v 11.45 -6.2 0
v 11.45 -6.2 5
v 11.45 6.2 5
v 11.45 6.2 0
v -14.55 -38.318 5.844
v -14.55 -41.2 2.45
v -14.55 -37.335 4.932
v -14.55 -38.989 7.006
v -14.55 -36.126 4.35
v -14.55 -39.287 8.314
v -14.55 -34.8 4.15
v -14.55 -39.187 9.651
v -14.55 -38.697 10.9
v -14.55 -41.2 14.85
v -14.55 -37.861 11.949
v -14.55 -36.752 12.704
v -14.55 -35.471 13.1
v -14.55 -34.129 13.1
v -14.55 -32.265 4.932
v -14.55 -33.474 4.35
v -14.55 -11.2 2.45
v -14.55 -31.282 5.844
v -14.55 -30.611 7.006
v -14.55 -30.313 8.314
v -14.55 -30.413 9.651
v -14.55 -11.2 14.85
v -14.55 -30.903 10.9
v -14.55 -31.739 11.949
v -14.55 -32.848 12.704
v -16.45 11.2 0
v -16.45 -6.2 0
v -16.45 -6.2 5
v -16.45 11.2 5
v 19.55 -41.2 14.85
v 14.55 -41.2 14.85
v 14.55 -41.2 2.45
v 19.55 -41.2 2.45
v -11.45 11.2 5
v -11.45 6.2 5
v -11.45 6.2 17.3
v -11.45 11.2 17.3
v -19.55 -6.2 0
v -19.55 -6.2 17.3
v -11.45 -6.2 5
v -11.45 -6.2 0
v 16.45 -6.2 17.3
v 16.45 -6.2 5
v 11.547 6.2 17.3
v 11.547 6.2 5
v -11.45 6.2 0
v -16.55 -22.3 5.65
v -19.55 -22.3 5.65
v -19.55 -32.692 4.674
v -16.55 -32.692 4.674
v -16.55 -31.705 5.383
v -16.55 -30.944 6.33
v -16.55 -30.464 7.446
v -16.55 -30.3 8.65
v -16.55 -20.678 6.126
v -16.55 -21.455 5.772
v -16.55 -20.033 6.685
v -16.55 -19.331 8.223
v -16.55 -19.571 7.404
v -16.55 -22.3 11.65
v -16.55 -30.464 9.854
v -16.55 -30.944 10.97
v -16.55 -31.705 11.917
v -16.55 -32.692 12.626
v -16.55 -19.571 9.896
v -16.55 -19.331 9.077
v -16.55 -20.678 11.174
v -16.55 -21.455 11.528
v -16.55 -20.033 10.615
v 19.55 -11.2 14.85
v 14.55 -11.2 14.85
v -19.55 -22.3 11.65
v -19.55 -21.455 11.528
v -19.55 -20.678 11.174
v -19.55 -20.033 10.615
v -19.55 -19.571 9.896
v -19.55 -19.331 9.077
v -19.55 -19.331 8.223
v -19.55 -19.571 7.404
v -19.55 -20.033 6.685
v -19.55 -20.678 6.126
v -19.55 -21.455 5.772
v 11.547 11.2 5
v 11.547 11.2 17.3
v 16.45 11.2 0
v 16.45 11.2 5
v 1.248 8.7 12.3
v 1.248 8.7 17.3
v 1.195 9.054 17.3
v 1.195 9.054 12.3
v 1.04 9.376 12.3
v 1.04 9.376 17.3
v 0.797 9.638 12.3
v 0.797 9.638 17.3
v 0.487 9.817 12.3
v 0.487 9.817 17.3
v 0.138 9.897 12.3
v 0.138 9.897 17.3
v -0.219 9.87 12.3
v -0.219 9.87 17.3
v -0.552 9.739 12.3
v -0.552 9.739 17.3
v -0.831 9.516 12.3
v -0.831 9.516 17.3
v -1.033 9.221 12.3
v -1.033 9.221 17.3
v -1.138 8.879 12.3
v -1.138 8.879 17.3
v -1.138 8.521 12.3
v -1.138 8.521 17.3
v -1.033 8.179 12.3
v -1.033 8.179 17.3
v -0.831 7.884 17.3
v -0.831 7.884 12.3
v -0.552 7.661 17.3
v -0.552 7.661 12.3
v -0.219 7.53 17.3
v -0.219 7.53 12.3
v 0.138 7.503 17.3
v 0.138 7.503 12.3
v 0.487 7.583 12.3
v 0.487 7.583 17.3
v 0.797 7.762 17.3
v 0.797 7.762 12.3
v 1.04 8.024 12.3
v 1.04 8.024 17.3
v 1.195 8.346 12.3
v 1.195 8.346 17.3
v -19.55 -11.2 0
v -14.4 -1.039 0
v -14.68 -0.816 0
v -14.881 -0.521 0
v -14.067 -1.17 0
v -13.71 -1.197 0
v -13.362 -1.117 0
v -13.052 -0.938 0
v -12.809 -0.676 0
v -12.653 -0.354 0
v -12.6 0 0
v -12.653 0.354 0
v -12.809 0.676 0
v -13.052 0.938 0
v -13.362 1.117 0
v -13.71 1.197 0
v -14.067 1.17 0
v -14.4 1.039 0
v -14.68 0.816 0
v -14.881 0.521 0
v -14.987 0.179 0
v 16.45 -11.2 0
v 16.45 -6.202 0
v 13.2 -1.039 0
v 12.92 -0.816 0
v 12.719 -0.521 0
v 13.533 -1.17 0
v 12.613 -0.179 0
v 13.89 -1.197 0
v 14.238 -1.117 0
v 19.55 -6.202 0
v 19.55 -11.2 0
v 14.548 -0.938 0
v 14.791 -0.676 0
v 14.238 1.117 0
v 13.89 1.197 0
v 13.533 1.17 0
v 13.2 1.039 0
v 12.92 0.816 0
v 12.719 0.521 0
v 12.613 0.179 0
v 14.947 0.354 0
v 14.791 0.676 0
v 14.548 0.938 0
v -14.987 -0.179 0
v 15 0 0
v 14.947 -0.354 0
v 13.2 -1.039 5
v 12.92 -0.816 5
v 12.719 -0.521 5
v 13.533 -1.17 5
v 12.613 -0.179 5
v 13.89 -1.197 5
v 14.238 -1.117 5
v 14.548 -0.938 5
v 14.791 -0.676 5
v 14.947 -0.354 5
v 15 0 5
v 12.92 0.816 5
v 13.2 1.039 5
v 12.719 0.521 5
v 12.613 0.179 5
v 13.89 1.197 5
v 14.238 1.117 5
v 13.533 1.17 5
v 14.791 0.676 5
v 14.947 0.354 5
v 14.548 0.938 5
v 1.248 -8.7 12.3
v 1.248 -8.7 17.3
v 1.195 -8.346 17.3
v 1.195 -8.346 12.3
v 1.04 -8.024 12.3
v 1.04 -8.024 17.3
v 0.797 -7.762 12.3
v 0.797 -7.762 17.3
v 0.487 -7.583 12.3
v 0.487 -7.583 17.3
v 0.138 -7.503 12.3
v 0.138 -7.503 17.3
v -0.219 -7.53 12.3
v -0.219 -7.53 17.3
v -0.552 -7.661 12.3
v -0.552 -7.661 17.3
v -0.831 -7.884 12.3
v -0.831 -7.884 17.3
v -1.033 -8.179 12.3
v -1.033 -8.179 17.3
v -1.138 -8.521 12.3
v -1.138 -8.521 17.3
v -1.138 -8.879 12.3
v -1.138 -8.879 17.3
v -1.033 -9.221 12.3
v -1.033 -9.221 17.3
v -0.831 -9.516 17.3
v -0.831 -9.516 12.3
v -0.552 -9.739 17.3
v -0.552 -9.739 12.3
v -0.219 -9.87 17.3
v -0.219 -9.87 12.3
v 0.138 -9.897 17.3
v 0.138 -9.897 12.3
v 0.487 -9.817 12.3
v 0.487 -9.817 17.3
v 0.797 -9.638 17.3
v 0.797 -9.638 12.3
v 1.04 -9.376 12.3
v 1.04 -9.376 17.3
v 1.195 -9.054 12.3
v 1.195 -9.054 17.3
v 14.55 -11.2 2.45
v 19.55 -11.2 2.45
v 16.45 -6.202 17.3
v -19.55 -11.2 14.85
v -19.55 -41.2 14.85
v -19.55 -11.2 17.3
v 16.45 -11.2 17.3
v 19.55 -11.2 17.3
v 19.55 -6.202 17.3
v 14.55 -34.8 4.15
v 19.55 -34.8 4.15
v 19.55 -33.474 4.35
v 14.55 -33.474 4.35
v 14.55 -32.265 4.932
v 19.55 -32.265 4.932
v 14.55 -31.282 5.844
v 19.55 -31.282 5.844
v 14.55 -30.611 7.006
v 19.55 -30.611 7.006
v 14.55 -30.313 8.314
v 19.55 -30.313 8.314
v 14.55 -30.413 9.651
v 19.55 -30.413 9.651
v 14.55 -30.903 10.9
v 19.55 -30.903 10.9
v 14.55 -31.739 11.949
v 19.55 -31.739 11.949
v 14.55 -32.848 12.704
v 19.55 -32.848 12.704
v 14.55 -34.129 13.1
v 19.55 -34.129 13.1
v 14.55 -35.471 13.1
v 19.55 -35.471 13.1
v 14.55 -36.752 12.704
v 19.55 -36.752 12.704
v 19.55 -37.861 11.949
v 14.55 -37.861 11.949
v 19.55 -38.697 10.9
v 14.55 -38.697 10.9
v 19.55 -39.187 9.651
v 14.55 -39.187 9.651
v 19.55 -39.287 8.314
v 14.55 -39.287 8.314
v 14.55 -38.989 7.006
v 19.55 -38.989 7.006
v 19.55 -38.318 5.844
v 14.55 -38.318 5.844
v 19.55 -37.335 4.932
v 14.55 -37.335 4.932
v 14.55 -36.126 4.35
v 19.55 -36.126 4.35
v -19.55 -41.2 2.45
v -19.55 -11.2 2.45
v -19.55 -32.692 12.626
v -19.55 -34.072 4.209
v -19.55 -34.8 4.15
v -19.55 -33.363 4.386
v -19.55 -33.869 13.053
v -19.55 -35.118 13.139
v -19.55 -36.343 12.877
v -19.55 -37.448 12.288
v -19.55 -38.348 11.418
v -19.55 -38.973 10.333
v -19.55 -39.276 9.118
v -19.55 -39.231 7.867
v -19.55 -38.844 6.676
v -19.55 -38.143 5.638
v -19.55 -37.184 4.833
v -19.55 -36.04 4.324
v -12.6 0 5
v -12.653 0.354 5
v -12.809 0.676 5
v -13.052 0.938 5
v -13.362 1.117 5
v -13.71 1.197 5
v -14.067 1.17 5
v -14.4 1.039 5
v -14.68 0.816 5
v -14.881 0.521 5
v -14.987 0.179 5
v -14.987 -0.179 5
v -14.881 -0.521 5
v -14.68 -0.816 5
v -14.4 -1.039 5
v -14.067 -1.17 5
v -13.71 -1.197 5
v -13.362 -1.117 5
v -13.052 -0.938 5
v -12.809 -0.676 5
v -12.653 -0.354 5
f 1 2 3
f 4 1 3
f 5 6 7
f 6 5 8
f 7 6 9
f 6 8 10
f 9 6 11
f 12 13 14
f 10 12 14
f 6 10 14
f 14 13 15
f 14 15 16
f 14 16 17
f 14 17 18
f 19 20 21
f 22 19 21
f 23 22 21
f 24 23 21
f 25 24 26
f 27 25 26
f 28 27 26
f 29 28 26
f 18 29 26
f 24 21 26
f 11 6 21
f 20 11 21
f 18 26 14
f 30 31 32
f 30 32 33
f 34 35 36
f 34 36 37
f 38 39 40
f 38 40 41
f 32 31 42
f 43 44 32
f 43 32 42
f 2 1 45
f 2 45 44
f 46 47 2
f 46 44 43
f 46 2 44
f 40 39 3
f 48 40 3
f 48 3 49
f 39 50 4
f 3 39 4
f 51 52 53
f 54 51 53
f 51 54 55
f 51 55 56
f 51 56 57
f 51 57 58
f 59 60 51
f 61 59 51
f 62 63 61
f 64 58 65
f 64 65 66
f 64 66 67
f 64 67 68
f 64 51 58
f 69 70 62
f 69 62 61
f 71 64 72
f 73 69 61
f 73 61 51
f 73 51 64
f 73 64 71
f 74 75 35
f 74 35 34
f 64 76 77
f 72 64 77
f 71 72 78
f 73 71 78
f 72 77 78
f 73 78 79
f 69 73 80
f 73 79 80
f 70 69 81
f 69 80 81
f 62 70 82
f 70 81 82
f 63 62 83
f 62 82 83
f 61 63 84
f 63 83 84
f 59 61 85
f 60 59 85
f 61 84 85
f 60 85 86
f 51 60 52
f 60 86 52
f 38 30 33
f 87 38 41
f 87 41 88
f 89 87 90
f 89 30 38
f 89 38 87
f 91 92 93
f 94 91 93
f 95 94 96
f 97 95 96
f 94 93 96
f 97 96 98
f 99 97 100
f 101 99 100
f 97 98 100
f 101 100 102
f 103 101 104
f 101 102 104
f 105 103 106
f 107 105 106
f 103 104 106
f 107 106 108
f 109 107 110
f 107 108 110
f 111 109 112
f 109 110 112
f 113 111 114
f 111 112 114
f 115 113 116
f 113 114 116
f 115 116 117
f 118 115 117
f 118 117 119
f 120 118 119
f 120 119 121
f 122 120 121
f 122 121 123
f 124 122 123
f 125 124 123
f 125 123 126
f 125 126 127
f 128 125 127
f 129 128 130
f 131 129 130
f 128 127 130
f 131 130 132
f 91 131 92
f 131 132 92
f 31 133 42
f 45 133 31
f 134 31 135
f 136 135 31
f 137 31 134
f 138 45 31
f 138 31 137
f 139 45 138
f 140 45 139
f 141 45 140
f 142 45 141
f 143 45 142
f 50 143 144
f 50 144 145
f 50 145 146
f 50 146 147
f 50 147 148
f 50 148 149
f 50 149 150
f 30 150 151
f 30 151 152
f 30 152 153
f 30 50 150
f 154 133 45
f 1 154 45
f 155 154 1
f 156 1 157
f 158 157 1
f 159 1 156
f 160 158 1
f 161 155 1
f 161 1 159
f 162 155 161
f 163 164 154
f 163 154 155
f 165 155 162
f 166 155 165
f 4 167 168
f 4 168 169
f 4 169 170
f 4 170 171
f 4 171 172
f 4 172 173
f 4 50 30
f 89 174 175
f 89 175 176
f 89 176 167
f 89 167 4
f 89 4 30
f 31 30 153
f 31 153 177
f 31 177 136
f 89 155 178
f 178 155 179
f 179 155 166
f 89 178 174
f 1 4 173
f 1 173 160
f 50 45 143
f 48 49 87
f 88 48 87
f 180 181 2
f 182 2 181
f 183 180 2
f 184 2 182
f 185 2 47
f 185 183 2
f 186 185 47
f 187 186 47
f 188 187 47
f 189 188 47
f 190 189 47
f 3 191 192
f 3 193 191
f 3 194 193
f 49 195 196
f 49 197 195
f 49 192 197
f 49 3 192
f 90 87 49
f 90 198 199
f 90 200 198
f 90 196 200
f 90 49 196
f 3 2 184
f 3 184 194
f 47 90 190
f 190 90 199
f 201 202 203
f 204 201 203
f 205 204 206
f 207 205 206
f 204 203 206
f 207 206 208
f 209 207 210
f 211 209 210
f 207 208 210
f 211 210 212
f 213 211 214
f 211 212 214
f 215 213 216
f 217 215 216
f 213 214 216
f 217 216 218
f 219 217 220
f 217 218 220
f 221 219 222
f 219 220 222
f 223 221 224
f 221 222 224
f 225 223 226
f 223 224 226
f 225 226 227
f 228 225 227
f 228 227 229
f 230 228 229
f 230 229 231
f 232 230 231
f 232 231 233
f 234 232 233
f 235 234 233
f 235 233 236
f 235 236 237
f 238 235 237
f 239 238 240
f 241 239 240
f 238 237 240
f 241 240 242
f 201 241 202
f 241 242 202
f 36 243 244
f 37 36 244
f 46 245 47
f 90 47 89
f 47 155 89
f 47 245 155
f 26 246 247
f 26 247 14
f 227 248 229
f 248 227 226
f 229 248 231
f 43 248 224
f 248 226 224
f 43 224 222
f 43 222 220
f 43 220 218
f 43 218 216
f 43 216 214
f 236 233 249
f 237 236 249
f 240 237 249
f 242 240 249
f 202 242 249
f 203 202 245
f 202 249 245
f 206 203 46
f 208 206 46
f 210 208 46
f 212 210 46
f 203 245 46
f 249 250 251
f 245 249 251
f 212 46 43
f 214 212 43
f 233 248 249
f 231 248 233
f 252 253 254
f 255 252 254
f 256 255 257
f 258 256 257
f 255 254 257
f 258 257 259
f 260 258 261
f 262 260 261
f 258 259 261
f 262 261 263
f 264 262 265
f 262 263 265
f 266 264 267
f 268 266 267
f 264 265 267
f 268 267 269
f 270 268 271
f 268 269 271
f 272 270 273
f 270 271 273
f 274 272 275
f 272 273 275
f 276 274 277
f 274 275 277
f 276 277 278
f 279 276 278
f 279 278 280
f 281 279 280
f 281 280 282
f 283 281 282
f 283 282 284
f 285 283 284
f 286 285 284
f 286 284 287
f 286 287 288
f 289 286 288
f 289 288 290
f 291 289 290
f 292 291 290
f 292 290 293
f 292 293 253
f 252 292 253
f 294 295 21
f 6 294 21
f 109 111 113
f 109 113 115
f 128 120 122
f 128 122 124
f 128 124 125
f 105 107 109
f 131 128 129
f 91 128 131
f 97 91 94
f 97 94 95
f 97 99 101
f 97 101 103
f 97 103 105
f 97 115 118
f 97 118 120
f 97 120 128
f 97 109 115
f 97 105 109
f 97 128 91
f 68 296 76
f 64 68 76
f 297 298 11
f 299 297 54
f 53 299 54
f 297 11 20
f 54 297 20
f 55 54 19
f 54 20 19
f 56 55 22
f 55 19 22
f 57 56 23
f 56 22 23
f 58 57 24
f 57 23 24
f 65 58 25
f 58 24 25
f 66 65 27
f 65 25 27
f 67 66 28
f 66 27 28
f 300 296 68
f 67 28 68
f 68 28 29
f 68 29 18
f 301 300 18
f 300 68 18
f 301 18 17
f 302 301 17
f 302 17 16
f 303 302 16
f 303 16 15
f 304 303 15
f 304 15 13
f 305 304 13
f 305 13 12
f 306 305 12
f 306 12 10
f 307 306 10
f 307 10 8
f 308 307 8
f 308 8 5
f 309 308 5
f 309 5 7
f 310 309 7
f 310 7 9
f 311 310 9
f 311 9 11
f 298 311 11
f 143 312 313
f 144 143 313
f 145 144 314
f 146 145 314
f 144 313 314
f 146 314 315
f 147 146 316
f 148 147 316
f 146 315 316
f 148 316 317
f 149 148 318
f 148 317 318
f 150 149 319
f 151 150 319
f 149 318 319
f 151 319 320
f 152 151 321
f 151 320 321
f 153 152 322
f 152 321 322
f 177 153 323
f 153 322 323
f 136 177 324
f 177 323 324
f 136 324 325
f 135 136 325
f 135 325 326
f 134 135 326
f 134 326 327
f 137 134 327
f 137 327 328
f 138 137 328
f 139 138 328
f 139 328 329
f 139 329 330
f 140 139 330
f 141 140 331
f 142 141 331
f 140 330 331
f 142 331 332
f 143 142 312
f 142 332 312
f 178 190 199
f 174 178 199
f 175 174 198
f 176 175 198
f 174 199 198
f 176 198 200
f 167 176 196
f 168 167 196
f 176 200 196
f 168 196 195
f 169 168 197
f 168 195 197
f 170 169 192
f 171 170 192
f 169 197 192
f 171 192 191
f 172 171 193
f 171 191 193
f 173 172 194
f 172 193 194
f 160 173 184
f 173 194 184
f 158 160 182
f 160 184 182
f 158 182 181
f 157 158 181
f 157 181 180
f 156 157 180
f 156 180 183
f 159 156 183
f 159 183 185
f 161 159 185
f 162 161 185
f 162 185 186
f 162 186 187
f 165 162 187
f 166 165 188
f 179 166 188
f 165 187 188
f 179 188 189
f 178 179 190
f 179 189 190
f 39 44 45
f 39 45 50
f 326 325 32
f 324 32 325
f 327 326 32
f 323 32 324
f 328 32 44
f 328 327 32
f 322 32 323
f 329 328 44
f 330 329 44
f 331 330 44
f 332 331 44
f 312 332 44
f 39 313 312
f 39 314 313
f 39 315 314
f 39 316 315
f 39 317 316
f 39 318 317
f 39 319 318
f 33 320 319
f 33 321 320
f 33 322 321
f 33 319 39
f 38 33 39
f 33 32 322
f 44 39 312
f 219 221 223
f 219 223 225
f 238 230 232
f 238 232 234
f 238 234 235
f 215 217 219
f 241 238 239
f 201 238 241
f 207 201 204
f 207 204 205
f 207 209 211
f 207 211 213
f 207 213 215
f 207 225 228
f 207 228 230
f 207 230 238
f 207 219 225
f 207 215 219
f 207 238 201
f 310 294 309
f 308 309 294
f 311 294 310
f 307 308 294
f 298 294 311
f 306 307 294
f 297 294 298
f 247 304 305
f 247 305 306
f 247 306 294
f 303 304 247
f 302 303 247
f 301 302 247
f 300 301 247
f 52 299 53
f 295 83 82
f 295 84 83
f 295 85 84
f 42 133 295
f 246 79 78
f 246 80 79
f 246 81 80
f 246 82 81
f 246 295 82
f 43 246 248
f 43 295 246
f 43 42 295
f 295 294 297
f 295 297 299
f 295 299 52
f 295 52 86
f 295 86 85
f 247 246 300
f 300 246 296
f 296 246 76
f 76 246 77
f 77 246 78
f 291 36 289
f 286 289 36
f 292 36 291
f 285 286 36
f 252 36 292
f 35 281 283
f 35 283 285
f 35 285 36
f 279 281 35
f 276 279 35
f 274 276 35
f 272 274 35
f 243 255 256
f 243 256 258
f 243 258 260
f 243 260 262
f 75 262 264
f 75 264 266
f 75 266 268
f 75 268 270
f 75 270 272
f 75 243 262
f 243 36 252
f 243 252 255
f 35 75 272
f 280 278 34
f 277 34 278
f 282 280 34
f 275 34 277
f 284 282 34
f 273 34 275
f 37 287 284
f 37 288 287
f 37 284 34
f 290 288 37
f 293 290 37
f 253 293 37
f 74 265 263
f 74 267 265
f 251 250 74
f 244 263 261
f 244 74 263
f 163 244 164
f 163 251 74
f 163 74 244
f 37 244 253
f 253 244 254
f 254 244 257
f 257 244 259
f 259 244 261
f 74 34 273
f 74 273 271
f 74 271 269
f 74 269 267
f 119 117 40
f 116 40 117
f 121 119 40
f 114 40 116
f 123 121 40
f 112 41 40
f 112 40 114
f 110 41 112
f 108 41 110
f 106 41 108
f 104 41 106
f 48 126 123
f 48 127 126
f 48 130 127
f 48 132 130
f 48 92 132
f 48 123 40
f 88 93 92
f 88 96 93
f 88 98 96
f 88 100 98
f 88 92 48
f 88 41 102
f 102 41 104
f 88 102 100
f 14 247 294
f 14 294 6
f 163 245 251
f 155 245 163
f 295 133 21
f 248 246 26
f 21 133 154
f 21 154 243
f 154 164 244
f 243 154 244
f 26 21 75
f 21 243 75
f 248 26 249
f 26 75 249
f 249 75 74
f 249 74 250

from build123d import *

# Parameters (mm, degrees)
SKETCH1_W           = 32.9
SKETCH1_H           = 22.4
BOSS_EXTRUDE1_DEPTH = 5
SKETCH2_R           = 1.2
SKETCH2_W           = 22.9
SKETCH2_H           = 12.4
CUT_EXTRUDE2_DEPTH  = 5
SKETCH3_W           = 22.996888994
SKETCH3_H           = 5
BOSS_EXTRUDE2_DEPTH = 12.3
SKETCH4_R           = 1.2
CUT_EXTRUDE3_DEPTH  = 5
SKETCH6_W           = 5
SKETCH6_H           = 5
SKETCH6_W_2         = 4.903111006
BOSS_EXTRUDE3_DEPTH = 12.3
SKETCH8_W           = 17.3
SKETCH8_H           = 4.998204887
BOSS_EXTRUDE4_DEPTH = 3.1
SKETCH9_W           = 17.3
SKETCH9_H           = 5
BOSS_EXTRUDE5_DEPTH = 3.1
SKETCH18_W          = 5
SKETCH18_H          = 12.4
BOSS_EXTRUDE7_DEPTH = 30
SKETCH19_R          = 4.5
CUT_EXTRUDE6_DEPTH  = 30
SKETCH20_R          = 4.5
CUT_EXTRUDE7_DEPTH  = 30
SKETCH10_W          = 5
SKETCH10_H          = 12.4
BOSS_EXTRUDE6_DEPTH = 30
SKETCH21_R          = 4.5
CUT_EXTRUDE8_DEPTH  = 10
SKETCH22_R          = 4.5
CUT_EXTRUDE9_DEPTH  = 10
CUT_EXTRUDE10_DEPTH = 3


with BuildPart() as part:
    # Sketch1 → Boss-Extrude1 (new body)
    with BuildSketch(Plane.XY):
        Rectangle(SKETCH1_W, SKETCH1_H)
    extrude(amount=BOSS_EXTRUDE1_DEPTH)

    # Sketch2 → Cut-Extrude2 (cut)
    with BuildSketch(Plane.XY.offset(5)):
        with Locations((13.8, 0)):
            Circle(SKETCH2_R)
        with Locations((-13.8, 0)):
            Circle(SKETCH2_R)
        Rectangle(SKETCH2_W, SKETCH2_H)
    extrude(amount=-CUT_EXTRUDE2_DEPTH, mode=Mode.SUBTRACT)

    # Sketch3 → Boss-Extrude2 (add)
    with BuildSketch(Plane.XY.offset(5)):
        with Locations((0.048444497, 8.7)):
            Rectangle(SKETCH3_W, SKETCH3_H)
        with Locations((0.048444497, -8.7)):
            Rectangle(SKETCH3_W, SKETCH3_H)
    extrude(amount=BOSS_EXTRUDE2_DEPTH)

    # Sketch4 → Cut-Extrude3 (cut)
    with BuildSketch(Plane.XY.offset(17.3)):
        with Locations((0.048444497, 8.7)):
            Circle(SKETCH4_R)
        with Locations((0.048444497, -8.7)):
            Circle(SKETCH4_R)
    extrude(amount=-CUT_EXTRUDE3_DEPTH, mode=Mode.SUBTRACT)

    # Sketch6 → Boss-Extrude3 (add)
    with BuildSketch(Plane.XY.offset(5)):
        with Locations((-13.95, -8.7)):
            Rectangle(SKETCH6_W, SKETCH6_H)
        with Locations((13.998444497, -8.7)):
            Rectangle(SKETCH6_W_2, SKETCH6_H)
    extrude(amount=BOSS_EXTRUDE3_DEPTH)

    # Sketch8 → Boss-Extrude4 (add)
    with BuildSketch(Plane(origin=(16.45, 0, 0), x_dir=(0, 0, -1), z_dir=(1, 0, 0))):
        with Locations((-8.65, -8.700897557)):
            Rectangle(SKETCH8_W, SKETCH8_H)
    extrude(amount=BOSS_EXTRUDE4_DEPTH)

    # Sketch9 → Boss-Extrude5 (add)
    with BuildSketch(Plane.ZY.offset(16.45)):
        with Locations((8.65, -8.7)):
            Rectangle(SKETCH9_W, SKETCH9_H)
    extrude(amount=BOSS_EXTRUDE5_DEPTH)

    # Sketch18 → Boss-Extrude7 (add)
    with BuildSketch(Plane.XZ.offset(11.2)):
        with Locations((-17.05, 8.65)):
            Rectangle(SKETCH18_W, SKETCH18_H)
        with Locations((17.05, 8.65)):
            Rectangle(SKETCH18_W, SKETCH18_H)
    extrude(amount=BOSS_EXTRUDE7_DEPTH)

    # Sketch19 → Cut-Extrude6 (cut)
    with BuildSketch(Plane.ZY.offset(19.55)):
        with Locations((8.65, -34.8)):
            Circle(SKETCH19_R)
    extrude(amount=-CUT_EXTRUDE6_DEPTH, mode=Mode.SUBTRACT)

    # Sketch20 → Cut-Extrude7 (cut)
    with BuildSketch(Plane(origin=(19.55, 0, 0), x_dir=(0, 0, -1), z_dir=(1, 0, 0))):
        with Locations((-8.65, -34.8)):
            Circle(SKETCH20_R)
    extrude(amount=-CUT_EXTRUDE7_DEPTH, mode=Mode.SUBTRACT)

    # Sketch10 → Boss-Extrude6 (add)
    with BuildSketch(Plane.XZ.offset(11.2)):
        with Locations((17.05, 8.65)):
            Rectangle(SKETCH10_W, SKETCH10_H)
        with Locations((-17.05, 8.65)):
            Rectangle(SKETCH10_W, SKETCH10_H)
    extrude(amount=BOSS_EXTRUDE6_DEPTH)

    # Sketch21 → Cut-Extrude8 (cut)
    with BuildSketch(Plane(origin=(19.55, 0, 0), x_dir=(0, 0, -1), z_dir=(1, 0, 0))):
        with Locations((-8.65, -34.8)):
            Circle(SKETCH21_R)
    extrude(amount=-CUT_EXTRUDE8_DEPTH, mode=Mode.SUBTRACT)

    # Sketch22 → Cut-Extrude9 (cut)
    with BuildSketch(Plane(origin=(-14.55, 0, 0), x_dir=(0, 0, -1), z_dir=(1, 0, 0))):
        with Locations((-8.65, -34.8)):
            Circle(SKETCH22_R)
    extrude(amount=-CUT_EXTRUDE9_DEPTH, mode=Mode.SUBTRACT)

    # Sketch23 → Cut-Extrude10 (cut)
    with BuildSketch(Plane.ZY.offset(19.55)):
        with BuildLine():
            Line((5.65, -22.3), (4.674239456, -32.692079676))
            ThreePointArc((4.674239456, -32.692079676), (8.65, -30.3), (12.625760544, -32.692079676))
            Line((12.625760544, -32.692079676), (11.65, -22.3))
            ThreePointArc((11.65, -22.3), (8.65, -19.3), (5.65, -22.3))
        make_face()
    extrude(amount=-CUT_EXTRUDE10_DEPTH, mode=Mode.SUBTRACT)


solid = part.part
